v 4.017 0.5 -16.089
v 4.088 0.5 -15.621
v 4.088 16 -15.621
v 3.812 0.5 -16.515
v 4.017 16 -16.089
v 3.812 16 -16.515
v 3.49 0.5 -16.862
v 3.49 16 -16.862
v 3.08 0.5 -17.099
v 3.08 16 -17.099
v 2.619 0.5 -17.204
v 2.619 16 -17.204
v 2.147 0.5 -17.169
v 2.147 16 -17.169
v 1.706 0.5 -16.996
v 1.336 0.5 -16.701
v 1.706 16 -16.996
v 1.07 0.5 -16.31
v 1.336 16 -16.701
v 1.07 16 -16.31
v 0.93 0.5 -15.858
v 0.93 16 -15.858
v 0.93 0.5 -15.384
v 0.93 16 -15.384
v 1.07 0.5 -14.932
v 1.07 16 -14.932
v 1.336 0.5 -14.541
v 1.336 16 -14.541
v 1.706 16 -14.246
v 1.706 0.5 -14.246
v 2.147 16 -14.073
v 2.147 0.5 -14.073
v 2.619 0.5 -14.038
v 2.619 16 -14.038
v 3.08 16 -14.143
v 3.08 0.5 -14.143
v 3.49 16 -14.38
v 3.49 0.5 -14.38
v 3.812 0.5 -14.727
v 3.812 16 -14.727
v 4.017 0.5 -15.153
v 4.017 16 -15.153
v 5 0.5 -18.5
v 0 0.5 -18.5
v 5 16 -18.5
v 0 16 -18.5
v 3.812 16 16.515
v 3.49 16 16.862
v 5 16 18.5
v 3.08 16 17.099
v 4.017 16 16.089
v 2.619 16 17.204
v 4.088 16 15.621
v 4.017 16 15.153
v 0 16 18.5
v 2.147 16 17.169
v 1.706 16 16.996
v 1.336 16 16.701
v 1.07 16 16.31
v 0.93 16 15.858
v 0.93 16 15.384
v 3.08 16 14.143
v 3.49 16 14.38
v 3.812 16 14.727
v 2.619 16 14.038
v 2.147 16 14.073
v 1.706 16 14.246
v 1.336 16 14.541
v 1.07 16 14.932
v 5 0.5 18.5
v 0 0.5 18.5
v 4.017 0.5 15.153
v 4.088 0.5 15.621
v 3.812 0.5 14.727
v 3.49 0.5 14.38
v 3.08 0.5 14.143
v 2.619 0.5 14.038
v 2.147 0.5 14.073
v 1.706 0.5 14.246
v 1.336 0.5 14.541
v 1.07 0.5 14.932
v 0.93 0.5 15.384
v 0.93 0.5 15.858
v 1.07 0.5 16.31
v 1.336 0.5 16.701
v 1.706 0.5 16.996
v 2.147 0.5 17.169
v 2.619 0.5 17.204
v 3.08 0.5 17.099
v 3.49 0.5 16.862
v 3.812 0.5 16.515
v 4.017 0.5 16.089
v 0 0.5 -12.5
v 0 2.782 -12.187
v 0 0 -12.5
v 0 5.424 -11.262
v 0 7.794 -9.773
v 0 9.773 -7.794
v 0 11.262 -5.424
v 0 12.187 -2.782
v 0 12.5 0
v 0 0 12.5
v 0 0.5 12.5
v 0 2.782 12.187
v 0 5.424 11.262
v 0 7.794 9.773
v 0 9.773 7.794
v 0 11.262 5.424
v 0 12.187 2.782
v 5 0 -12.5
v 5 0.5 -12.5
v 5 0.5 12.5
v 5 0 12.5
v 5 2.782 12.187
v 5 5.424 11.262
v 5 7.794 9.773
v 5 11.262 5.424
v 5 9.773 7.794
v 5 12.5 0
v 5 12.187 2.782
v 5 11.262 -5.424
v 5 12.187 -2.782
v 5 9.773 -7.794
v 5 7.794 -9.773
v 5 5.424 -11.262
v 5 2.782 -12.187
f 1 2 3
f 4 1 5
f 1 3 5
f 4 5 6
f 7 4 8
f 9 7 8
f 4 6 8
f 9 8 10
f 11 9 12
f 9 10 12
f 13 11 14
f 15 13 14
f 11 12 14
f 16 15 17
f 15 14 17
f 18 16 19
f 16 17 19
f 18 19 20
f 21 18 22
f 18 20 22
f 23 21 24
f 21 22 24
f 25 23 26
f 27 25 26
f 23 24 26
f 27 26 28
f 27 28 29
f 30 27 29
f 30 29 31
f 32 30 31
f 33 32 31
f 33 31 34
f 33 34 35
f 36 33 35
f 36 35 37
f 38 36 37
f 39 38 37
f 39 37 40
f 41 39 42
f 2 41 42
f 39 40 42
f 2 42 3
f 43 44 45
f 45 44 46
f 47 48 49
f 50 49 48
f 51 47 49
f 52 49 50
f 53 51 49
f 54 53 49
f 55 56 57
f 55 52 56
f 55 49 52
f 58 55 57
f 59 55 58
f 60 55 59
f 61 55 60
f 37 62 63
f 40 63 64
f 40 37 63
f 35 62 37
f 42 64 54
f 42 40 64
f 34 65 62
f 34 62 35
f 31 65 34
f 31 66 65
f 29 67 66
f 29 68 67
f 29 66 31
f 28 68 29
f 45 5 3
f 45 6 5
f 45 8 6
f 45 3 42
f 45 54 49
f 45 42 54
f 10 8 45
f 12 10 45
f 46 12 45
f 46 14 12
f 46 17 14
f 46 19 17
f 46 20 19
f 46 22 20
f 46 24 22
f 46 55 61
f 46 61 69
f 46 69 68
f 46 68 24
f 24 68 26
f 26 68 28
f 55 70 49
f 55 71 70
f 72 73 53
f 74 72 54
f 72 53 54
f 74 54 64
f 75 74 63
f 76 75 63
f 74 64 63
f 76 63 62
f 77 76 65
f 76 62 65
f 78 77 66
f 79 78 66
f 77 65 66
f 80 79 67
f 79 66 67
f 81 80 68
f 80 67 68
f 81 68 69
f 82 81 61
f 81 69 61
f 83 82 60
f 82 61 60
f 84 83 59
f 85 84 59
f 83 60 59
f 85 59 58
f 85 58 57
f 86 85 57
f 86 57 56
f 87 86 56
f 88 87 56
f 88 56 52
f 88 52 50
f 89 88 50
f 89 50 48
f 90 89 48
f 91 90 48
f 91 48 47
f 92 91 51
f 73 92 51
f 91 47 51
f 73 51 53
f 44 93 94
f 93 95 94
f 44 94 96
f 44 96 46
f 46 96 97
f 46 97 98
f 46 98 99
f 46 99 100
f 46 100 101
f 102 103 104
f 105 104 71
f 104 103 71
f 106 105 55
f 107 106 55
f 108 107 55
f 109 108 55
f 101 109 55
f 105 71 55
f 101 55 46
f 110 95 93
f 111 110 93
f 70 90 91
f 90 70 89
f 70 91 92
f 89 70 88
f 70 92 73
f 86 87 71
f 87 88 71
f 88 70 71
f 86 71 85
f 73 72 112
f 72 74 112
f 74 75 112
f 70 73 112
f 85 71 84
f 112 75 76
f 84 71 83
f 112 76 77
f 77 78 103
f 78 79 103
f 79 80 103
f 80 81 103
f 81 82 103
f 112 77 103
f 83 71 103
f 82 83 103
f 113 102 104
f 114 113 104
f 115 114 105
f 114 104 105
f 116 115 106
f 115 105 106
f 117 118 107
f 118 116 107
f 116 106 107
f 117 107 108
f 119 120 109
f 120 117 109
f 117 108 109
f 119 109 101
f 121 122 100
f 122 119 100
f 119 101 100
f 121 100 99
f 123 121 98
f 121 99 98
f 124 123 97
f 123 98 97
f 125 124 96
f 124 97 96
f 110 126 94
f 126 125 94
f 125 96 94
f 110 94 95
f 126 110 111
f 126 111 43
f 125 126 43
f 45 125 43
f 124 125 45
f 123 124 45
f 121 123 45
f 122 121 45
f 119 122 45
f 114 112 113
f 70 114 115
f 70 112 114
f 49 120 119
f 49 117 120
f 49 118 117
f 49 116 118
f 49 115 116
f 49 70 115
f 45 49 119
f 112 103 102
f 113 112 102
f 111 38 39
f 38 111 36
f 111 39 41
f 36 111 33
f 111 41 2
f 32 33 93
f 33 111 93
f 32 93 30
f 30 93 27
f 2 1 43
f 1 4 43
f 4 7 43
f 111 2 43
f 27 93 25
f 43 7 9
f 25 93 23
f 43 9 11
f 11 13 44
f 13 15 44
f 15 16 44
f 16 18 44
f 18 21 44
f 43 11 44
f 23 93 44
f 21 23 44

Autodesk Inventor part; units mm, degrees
ref_plane "YZ Plane" through (0, 0, 0) normal (1, 0, 0) x (0, 1, 0)
ref_plane "XZ Plane" through (0, 0, 0) normal (0, 1, 0) x (-1, 0, 0)
ref_plane "XY Plane" through (0, 0, 0) normal (0, 0, 1) x (1, 0, 0)
sketch "Sketch1" plane through (0, 0, 0) normal (1, 0, 0) x (0, 1, 0)
  circle A0 centre (0, 0) radius 12.5
  line L0 (0, 12.5) -> (0, -12.5)
  line L1 (0, -12.5) -> (12.5, -12.5)
  line L2 (12.5, -12.5) -> (12.5, 12.5)
  line L3 (12.5, 12.5) -> (0, 12.5)
  line L4 (12.5, 12.5) -> (16, 12.5)
  line L5 (16, 12.5) -> (16, -12.5)
  line L6 (16, -12.5) -> (12.5, -12.5)
  line L7 (12.5, -12.5) -> (12.5, 12.5)
  line L8 (16, 12.5) -> (12.5, 12.5)
  line L9 (12.5, 12.5) -> (12.5, 18.5)
  line L10 (12.5, 18.5) -> (16, 18.5)
  line L11 (16, 18.5) -> (16, 12.5)
  line L12 (16, -12.5) -> (12.5, -12.5)
  line L13 (12.5, -12.5) -> (12.5, -18.5)
  line L14 (12.5, -18.5) -> (16, -18.5)
  line L15 (16, -18.5) -> (16, -12.5)
  line L16 (12.5, 18.5) -> (12.5, 12.5)
  line L17 (12.5, -18.5) -> (12.5, -12.5)
  line L18 (16, 18.5) -> (0.5, 18.5)
  line L19 (0.5, 18.5) -> (0.5, 12.5)
  line L20 (0.5, 12.5) -> (16, 12.5)
  line L21 (16, 12.5) -> (16, 18.5)
  line L22 (16, -12.5) -> (0.5, -12.5)
  line L23 (0.5, -12.5) -> (0.5, -18.5)
  line L24 (0.5, -18.5) -> (16, -18.5)
  line L25 (16, -18.5) -> (16, -12.5)
  point P0 (12.5, 0)
  dimension "d0" = 25
  dimension "d1" = 3.5
  dimension "d2" = 25
  dimension "d3" = 6
  dimension "d4" = 6
  dimension "d15" = 15.5
  dimension "d16" = 15.5
extrude "Extrusion3" add sketch "Sketch1" along normal blind 5 contours L2 L1 A0 | L2 L4 L5 L6 | A0 L3 L2 | L13 L24 L23 L1 | L6 L15 L14 L13 | L9 L10 L11 L4 | L3 L19 L18 L9
sketch "Sketch4" plane through (0, 16, 18.5) normal (0, 1, 0) x (1, 0, 0)
  line L0 (0, 37) -> (5, 37)
  line L1 (0, 0) -> (5, 0)
  circle A0 centre (2.5, 2.879) radius 1.5875
  circle A1 centre (2.5, 34.121) radius 1.5875
  line L2 (0, 37) -> (0, 0) projected
  line L3 (5, 37) -> (5, 0) projected
  line L4 (0, 18.5) -> (5, 18.5)
  dimension "d23" = 3.175
  dimension "d24" = 3.175
  dimension "d27" = 2.5
  dimension "d28" = 15.621
  dimension "d29" = 15.621
extrude "Extrusion5" cut sketch "Sketch4" against normal blind 20 contours A0 | A1
properties part number "TubeClamp"
